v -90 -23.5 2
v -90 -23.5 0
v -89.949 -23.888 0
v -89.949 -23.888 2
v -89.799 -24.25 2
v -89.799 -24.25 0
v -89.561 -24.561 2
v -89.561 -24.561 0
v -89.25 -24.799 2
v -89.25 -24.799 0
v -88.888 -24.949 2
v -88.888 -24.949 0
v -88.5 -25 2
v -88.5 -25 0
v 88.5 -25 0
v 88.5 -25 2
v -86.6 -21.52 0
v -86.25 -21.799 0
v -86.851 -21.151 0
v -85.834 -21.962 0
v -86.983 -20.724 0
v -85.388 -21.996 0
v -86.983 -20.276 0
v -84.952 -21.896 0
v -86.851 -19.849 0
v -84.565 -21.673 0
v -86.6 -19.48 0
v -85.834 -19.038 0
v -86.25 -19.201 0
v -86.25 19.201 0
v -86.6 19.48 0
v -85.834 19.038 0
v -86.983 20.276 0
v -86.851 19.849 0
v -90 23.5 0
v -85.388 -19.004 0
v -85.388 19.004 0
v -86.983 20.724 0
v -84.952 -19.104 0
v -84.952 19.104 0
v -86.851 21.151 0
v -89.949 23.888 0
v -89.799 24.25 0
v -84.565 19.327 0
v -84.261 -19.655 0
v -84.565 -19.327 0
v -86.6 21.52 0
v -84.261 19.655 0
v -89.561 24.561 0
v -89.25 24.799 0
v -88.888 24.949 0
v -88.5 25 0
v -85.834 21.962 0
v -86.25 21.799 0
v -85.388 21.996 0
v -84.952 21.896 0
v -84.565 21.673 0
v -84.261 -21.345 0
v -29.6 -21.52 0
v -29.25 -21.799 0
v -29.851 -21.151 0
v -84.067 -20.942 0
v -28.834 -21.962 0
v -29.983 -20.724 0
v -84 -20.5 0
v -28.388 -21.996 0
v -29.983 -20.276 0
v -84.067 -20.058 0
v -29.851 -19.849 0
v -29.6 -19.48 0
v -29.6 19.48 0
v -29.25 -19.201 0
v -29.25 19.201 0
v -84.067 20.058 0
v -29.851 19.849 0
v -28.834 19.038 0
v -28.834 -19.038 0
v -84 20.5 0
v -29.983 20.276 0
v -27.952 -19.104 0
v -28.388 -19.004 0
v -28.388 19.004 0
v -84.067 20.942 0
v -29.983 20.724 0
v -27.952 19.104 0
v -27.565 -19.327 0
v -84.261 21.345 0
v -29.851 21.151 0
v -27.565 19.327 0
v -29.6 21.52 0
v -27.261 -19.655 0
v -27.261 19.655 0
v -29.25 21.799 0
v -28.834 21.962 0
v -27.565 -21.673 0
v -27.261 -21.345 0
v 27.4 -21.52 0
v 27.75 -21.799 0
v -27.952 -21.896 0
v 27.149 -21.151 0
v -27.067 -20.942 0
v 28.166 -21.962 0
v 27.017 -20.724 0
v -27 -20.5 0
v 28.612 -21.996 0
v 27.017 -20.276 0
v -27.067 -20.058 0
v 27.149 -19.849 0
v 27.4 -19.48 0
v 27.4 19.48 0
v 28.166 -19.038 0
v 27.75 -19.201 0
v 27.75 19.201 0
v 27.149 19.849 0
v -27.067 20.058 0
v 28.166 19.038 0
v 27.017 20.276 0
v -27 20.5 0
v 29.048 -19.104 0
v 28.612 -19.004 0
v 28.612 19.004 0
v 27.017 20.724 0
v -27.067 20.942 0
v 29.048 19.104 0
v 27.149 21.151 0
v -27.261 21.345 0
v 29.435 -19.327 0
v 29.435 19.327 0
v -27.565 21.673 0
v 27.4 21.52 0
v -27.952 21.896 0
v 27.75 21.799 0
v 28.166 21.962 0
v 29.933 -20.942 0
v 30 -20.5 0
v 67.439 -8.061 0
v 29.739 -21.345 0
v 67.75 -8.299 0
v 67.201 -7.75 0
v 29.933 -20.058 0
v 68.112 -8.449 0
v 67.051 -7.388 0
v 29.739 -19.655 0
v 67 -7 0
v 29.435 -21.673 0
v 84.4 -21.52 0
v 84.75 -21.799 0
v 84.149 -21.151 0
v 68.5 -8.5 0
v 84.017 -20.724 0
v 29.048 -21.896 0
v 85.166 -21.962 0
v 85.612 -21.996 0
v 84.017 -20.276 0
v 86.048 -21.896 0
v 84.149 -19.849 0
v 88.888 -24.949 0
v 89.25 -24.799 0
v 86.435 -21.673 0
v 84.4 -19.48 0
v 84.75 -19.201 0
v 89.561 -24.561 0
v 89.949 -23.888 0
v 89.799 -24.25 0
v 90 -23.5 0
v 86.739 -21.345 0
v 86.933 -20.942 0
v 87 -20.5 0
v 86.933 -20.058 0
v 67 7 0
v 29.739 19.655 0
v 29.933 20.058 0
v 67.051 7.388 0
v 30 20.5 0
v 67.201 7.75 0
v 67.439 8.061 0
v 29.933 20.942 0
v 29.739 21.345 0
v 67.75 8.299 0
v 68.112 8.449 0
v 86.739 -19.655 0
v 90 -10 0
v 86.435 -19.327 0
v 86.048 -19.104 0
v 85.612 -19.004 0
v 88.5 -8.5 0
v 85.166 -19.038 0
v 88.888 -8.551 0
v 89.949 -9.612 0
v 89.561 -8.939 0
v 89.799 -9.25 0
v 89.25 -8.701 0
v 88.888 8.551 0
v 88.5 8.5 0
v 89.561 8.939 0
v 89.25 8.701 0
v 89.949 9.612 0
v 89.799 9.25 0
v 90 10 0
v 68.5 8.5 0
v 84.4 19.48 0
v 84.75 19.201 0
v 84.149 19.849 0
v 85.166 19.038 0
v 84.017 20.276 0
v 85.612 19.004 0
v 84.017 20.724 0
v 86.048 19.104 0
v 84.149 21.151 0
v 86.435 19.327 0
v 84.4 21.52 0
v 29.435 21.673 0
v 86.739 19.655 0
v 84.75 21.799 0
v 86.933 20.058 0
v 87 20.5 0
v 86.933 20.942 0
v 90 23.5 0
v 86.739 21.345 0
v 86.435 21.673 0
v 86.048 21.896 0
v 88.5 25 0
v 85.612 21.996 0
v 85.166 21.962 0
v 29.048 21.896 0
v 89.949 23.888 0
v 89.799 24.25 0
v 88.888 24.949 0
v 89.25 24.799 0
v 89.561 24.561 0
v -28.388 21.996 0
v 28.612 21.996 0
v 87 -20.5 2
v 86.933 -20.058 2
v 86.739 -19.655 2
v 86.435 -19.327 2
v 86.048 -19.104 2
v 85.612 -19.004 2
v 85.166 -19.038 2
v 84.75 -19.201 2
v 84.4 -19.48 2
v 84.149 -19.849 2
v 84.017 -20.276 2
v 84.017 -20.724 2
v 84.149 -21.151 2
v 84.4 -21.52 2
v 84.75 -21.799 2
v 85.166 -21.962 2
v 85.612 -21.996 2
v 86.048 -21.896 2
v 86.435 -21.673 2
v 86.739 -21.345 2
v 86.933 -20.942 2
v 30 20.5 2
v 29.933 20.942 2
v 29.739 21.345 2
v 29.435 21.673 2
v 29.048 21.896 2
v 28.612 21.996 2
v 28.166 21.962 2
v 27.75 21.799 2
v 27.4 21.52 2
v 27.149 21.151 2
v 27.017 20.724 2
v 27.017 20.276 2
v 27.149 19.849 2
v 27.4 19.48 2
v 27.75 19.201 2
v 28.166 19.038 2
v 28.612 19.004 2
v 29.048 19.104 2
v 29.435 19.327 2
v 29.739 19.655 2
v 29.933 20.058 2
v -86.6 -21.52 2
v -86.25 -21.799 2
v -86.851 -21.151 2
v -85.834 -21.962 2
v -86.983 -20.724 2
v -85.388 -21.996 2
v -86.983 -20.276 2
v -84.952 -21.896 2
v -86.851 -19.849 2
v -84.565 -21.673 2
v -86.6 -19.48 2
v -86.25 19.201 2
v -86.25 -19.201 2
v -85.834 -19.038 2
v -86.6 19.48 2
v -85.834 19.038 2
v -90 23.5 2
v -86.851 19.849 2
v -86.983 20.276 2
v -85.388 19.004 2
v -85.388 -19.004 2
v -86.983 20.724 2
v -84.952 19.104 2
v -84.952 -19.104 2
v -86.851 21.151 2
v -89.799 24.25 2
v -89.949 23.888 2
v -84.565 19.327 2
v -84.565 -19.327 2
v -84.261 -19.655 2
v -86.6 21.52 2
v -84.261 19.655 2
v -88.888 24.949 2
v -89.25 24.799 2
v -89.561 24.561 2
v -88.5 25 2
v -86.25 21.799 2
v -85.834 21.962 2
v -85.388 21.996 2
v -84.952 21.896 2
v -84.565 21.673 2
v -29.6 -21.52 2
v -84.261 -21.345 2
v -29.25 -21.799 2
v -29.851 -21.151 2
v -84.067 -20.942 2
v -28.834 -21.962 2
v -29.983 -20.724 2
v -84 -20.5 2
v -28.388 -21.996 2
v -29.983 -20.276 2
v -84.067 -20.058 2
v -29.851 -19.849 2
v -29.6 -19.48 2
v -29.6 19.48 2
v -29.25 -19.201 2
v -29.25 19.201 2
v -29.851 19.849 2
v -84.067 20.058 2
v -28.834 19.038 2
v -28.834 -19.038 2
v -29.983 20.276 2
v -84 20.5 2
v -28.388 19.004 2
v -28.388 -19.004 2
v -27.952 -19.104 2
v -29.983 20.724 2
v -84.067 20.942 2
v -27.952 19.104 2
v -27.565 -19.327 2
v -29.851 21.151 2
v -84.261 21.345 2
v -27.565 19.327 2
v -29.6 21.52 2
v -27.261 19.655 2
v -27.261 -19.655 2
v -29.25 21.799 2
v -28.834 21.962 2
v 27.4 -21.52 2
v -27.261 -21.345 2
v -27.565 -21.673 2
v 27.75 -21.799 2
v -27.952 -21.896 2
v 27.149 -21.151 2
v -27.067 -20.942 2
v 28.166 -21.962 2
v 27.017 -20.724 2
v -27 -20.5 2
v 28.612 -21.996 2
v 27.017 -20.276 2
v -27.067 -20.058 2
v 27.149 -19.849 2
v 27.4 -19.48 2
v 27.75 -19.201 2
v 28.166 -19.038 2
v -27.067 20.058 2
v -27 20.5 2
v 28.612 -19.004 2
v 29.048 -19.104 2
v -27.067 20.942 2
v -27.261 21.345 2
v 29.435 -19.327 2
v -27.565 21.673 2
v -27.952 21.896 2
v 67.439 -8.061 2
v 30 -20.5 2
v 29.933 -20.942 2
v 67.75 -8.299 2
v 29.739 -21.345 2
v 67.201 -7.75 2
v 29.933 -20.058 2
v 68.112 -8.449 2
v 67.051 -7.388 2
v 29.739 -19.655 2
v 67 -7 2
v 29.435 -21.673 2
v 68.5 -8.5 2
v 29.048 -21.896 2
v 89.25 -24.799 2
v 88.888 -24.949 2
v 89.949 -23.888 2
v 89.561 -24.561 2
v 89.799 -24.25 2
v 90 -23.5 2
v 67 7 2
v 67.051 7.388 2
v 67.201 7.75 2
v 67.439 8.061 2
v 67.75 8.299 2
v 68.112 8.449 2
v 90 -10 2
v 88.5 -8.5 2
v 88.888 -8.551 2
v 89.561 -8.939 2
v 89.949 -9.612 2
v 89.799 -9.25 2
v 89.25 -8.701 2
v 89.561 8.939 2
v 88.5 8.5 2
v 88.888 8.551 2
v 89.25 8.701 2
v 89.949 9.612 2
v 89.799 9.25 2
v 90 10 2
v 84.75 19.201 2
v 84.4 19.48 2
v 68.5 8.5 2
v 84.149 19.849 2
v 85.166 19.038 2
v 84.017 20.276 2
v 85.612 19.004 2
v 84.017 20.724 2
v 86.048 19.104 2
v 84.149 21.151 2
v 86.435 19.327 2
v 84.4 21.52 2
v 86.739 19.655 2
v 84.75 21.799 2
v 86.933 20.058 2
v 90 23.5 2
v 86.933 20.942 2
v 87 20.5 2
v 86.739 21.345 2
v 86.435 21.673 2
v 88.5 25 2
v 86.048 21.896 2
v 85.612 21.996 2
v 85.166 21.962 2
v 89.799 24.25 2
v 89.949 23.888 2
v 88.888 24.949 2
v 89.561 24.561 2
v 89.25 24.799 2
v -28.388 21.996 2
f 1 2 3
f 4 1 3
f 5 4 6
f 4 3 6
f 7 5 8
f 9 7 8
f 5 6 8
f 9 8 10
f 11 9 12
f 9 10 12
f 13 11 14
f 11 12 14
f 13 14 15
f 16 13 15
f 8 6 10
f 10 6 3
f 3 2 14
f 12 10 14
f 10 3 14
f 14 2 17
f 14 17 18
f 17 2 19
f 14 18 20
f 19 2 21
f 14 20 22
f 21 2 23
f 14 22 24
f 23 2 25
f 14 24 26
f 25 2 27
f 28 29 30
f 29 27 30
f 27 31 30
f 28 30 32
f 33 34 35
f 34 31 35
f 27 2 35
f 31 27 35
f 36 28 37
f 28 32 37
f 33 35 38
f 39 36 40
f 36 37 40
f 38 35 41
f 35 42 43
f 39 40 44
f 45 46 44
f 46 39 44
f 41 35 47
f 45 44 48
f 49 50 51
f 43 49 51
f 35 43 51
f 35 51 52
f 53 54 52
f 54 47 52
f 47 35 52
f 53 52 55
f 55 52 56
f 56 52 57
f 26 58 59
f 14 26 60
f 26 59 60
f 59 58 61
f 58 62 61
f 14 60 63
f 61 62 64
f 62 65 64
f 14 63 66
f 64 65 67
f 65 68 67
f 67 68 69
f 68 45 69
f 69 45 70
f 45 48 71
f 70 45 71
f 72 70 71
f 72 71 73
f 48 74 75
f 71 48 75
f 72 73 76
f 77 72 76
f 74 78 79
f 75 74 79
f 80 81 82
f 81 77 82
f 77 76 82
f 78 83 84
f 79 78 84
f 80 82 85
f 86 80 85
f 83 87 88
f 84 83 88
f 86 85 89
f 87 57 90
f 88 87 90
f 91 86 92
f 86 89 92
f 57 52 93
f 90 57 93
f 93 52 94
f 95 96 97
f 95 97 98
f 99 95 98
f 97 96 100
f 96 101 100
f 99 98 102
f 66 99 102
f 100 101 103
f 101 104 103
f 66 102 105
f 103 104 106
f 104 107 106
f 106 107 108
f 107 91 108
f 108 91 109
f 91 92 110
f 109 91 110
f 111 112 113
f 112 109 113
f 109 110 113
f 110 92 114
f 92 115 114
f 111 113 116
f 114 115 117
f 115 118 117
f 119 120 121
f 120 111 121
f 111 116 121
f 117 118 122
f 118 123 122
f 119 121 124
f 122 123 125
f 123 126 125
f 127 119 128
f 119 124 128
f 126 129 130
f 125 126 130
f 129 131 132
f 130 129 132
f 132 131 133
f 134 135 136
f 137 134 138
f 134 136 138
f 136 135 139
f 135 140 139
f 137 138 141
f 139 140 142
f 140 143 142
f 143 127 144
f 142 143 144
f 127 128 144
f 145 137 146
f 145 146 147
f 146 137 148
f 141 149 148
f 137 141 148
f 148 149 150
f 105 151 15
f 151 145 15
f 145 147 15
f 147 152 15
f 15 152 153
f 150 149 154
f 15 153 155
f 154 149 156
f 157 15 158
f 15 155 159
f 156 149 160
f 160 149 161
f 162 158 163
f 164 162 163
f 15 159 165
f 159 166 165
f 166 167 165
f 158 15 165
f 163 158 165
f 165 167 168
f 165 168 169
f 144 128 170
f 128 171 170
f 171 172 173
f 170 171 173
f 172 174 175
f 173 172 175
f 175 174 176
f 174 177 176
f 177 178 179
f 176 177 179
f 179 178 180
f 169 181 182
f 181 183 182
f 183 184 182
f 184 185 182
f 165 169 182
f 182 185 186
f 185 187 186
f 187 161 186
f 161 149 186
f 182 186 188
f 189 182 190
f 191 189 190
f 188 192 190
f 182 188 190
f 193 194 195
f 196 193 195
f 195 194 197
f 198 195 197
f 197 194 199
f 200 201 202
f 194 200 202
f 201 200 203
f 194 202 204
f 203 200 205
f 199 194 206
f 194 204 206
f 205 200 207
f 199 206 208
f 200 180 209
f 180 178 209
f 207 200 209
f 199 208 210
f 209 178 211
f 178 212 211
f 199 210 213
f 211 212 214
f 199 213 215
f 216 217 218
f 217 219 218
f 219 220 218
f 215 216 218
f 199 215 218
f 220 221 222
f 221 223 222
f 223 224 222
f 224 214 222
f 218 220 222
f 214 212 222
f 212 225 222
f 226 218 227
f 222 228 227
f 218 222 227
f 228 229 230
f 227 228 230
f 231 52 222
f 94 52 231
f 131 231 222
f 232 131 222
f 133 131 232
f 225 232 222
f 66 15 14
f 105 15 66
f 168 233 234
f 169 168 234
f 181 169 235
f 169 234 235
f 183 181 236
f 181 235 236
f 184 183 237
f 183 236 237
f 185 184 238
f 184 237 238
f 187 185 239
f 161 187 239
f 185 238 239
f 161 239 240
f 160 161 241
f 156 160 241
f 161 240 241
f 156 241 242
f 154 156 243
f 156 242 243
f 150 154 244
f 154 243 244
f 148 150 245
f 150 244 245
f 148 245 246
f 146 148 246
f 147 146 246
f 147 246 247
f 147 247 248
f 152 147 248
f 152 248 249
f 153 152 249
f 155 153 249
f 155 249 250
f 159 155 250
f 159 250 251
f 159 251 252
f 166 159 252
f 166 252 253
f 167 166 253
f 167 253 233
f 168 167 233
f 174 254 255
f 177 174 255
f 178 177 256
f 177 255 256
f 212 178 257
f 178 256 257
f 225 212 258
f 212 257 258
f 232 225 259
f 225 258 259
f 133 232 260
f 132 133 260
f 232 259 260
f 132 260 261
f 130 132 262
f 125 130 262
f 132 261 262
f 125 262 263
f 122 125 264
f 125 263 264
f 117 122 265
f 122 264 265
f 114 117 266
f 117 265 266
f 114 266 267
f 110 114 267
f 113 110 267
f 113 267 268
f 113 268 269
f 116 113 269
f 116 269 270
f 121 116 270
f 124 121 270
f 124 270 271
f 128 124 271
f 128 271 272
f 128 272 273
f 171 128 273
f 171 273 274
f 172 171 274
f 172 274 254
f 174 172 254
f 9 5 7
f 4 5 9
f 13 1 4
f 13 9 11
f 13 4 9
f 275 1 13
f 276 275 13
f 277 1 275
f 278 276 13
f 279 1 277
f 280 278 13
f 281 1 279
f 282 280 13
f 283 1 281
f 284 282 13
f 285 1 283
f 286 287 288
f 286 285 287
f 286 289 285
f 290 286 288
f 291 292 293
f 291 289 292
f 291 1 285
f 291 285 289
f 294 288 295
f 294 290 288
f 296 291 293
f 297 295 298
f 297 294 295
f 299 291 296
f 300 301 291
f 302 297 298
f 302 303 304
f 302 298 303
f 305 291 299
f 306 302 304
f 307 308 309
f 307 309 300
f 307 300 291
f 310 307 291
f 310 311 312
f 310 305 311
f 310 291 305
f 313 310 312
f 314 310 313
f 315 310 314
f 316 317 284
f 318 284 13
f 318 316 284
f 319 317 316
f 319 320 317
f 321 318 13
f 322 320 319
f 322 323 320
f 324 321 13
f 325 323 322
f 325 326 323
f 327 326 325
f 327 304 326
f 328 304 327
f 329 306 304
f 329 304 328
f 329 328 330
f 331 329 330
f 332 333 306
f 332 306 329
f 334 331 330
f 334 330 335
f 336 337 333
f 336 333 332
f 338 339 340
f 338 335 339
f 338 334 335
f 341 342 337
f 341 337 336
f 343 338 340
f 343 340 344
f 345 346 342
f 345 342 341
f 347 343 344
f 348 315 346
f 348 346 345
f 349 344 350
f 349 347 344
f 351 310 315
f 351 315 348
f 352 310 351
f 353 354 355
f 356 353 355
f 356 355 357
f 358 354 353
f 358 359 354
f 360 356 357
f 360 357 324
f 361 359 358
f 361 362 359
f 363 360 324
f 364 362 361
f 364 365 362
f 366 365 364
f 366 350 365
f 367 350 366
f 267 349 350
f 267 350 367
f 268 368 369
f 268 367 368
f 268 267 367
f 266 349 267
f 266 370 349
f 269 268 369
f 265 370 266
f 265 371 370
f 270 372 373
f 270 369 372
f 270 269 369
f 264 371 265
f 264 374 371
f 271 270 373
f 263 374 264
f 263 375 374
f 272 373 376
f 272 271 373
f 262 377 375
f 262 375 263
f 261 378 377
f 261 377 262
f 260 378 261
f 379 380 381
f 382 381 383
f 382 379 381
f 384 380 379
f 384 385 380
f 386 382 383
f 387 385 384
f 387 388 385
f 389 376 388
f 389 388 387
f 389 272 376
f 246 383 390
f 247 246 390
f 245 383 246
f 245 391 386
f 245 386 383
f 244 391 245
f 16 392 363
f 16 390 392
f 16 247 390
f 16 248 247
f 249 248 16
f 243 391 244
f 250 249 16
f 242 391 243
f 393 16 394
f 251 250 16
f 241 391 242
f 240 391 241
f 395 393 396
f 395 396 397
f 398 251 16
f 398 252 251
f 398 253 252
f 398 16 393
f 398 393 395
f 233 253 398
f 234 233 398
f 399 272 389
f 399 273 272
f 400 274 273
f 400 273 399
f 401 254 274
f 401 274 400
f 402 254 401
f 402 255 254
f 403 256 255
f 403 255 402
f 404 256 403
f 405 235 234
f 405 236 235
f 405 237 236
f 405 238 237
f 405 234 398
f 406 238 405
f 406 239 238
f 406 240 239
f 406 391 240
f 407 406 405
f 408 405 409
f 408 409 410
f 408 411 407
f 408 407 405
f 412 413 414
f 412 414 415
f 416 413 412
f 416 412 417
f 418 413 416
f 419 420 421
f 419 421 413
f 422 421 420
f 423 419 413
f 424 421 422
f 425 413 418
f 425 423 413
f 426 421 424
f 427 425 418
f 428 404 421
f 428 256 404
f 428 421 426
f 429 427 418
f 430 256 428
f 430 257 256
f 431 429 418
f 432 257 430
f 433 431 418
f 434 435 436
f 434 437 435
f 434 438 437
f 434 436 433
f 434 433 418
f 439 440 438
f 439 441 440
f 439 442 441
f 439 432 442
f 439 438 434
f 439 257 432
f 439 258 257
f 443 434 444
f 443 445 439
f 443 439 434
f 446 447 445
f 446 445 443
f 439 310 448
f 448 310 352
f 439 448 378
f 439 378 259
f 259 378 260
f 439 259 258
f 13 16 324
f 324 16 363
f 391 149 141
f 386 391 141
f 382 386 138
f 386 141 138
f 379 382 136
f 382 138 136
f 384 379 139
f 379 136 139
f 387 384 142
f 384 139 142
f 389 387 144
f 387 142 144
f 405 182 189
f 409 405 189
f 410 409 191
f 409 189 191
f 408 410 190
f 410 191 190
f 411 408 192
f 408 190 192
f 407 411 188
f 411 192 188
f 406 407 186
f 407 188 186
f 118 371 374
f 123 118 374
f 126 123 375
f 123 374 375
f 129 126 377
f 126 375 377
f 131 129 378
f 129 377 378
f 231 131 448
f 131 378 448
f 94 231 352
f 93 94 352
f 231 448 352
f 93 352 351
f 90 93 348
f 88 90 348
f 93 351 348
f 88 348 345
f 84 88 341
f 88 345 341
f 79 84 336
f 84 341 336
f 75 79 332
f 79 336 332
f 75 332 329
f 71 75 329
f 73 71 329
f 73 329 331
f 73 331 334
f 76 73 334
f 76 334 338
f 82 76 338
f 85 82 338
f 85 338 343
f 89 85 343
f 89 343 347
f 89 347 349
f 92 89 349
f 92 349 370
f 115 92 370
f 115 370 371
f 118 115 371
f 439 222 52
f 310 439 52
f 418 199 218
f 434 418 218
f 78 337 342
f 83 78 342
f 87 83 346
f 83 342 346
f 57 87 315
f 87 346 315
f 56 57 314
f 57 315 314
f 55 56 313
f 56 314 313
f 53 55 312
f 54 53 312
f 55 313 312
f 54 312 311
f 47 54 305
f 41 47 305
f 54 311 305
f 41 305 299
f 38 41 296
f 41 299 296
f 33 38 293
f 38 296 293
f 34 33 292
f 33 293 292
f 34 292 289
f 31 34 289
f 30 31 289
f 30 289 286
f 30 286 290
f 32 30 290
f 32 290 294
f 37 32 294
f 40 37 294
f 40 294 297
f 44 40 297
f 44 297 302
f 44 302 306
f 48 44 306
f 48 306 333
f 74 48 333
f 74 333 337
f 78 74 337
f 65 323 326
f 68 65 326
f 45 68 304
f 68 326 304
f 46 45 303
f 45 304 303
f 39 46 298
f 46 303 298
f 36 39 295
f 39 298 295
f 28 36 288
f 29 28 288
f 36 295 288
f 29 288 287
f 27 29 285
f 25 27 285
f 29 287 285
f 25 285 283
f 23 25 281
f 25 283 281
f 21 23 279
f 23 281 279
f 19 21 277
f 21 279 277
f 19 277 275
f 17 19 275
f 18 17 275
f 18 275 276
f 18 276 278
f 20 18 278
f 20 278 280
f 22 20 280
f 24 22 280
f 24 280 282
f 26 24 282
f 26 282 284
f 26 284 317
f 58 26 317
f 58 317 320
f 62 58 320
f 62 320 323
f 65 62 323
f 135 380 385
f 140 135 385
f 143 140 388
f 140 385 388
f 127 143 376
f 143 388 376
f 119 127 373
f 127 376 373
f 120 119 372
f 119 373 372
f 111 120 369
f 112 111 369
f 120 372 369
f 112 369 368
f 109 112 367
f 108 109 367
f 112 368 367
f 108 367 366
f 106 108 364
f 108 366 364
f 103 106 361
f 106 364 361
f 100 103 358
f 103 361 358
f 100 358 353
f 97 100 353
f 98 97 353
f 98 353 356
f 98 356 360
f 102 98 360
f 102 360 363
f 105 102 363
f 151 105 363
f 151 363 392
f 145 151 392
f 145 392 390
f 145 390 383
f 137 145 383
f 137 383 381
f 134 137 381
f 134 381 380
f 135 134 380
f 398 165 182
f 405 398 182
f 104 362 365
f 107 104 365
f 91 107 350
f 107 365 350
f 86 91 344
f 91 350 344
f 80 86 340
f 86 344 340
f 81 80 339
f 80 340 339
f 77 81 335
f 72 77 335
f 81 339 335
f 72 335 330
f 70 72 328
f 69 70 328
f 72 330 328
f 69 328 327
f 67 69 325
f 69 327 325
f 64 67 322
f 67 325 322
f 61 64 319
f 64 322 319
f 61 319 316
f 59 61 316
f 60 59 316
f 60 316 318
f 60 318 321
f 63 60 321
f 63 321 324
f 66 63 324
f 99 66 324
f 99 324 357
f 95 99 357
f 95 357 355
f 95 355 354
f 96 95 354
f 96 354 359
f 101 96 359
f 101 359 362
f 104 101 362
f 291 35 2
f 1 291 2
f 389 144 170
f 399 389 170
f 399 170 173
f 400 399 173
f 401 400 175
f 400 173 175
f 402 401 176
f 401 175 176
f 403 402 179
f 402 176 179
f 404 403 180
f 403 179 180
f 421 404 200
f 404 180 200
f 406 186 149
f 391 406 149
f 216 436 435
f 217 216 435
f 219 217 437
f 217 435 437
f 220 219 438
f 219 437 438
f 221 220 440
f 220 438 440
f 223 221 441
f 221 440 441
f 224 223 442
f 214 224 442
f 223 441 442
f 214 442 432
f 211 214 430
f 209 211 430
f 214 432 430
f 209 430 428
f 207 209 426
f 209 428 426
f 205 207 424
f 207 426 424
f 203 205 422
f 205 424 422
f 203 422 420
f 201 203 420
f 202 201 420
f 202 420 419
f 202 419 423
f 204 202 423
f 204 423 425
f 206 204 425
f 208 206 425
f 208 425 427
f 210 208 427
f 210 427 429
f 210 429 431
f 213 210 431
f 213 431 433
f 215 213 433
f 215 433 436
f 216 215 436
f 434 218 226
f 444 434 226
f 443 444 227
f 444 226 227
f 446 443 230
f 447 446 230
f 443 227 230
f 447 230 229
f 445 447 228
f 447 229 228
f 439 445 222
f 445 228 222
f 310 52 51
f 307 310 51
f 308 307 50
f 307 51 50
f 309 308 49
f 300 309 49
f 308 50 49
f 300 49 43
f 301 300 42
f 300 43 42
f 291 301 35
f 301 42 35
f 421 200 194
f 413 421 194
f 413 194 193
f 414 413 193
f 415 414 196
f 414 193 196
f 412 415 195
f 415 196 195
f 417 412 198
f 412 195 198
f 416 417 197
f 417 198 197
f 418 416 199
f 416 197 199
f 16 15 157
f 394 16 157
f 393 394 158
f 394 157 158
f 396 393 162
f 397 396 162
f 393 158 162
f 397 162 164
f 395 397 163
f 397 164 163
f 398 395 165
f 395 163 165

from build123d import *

# Parameters (mm, degrees)
F1_DEPTH = 2
F2_R     = 1.5
F3_DEPTH = 2.001


with BuildPart() as f1:
    # F0 (on Top) → F1 (new body)
    with BuildSketch(Plane.XY):
        with BuildLine():
            Line((88.5, 25), (-88.5, 25))
            ThreePointArc((-88.5, 25), (-89.56066, 24.56066), (-90, 23.5))
            Line((-90, 23.5), (-90, -23.5))
            ThreePointArc((-90, -23.5), (-89.56066, -24.56066), (-88.5, -25))
            Line((-88.5, -25), (88.5, -25))
            ThreePointArc((88.5, -25), (89.56066, -24.56066), (90, -23.5))
            Line((90, -23.5), (90, -10))
            ThreePointArc((90, -10), (89.56066, -8.93934), (88.5, -8.5))
            Line((88.5, -8.5), (68.5, -8.5))
            ThreePointArc((68.5, -8.5), (67.43934, -8.06066), (67, -7))
            Line((67, -7), (67, 7))
            ThreePointArc((67, 7), (67.43934, 8.06066), (68.5, 8.5))
            Line((68.5, 8.5), (88.5, 8.5))
            ThreePointArc((88.5, 8.5), (89.56066, 8.93934), (90, 10))
            Line((90, 10), (90, 23.5))
            ThreePointArc((90, 23.5), (89.56066, 24.56066), (88.5, 25))
        make_face()
    extrude(amount=F1_DEPTH)

    # F2 (on face) → F3 (cut, through all)
    with BuildSketch(Plane.XY.offset(2)):
        with Locations((-85.5, 20.5)):
            Circle(F2_R)
        with Locations((-85.5, -20.5)):
            Circle(F2_R)
        with Locations((-28.5, -20.5)):
            Circle(F2_R)
        with Locations((-28.5, 20.5)):
            Circle(F2_R)
        with Locations((28.5, -20.5)):
            Circle(F2_R)
        with Locations((28.5, 20.5)):
            Circle(F2_R)
        with Locations((85.5, -20.5)):
            Circle(F2_R)
        with Locations((85.5, 20.5)):
            Circle(F2_R)
    extrude(amount=-F3_DEPTH, mode=Mode.SUBTRACT)


solid = f1.part
